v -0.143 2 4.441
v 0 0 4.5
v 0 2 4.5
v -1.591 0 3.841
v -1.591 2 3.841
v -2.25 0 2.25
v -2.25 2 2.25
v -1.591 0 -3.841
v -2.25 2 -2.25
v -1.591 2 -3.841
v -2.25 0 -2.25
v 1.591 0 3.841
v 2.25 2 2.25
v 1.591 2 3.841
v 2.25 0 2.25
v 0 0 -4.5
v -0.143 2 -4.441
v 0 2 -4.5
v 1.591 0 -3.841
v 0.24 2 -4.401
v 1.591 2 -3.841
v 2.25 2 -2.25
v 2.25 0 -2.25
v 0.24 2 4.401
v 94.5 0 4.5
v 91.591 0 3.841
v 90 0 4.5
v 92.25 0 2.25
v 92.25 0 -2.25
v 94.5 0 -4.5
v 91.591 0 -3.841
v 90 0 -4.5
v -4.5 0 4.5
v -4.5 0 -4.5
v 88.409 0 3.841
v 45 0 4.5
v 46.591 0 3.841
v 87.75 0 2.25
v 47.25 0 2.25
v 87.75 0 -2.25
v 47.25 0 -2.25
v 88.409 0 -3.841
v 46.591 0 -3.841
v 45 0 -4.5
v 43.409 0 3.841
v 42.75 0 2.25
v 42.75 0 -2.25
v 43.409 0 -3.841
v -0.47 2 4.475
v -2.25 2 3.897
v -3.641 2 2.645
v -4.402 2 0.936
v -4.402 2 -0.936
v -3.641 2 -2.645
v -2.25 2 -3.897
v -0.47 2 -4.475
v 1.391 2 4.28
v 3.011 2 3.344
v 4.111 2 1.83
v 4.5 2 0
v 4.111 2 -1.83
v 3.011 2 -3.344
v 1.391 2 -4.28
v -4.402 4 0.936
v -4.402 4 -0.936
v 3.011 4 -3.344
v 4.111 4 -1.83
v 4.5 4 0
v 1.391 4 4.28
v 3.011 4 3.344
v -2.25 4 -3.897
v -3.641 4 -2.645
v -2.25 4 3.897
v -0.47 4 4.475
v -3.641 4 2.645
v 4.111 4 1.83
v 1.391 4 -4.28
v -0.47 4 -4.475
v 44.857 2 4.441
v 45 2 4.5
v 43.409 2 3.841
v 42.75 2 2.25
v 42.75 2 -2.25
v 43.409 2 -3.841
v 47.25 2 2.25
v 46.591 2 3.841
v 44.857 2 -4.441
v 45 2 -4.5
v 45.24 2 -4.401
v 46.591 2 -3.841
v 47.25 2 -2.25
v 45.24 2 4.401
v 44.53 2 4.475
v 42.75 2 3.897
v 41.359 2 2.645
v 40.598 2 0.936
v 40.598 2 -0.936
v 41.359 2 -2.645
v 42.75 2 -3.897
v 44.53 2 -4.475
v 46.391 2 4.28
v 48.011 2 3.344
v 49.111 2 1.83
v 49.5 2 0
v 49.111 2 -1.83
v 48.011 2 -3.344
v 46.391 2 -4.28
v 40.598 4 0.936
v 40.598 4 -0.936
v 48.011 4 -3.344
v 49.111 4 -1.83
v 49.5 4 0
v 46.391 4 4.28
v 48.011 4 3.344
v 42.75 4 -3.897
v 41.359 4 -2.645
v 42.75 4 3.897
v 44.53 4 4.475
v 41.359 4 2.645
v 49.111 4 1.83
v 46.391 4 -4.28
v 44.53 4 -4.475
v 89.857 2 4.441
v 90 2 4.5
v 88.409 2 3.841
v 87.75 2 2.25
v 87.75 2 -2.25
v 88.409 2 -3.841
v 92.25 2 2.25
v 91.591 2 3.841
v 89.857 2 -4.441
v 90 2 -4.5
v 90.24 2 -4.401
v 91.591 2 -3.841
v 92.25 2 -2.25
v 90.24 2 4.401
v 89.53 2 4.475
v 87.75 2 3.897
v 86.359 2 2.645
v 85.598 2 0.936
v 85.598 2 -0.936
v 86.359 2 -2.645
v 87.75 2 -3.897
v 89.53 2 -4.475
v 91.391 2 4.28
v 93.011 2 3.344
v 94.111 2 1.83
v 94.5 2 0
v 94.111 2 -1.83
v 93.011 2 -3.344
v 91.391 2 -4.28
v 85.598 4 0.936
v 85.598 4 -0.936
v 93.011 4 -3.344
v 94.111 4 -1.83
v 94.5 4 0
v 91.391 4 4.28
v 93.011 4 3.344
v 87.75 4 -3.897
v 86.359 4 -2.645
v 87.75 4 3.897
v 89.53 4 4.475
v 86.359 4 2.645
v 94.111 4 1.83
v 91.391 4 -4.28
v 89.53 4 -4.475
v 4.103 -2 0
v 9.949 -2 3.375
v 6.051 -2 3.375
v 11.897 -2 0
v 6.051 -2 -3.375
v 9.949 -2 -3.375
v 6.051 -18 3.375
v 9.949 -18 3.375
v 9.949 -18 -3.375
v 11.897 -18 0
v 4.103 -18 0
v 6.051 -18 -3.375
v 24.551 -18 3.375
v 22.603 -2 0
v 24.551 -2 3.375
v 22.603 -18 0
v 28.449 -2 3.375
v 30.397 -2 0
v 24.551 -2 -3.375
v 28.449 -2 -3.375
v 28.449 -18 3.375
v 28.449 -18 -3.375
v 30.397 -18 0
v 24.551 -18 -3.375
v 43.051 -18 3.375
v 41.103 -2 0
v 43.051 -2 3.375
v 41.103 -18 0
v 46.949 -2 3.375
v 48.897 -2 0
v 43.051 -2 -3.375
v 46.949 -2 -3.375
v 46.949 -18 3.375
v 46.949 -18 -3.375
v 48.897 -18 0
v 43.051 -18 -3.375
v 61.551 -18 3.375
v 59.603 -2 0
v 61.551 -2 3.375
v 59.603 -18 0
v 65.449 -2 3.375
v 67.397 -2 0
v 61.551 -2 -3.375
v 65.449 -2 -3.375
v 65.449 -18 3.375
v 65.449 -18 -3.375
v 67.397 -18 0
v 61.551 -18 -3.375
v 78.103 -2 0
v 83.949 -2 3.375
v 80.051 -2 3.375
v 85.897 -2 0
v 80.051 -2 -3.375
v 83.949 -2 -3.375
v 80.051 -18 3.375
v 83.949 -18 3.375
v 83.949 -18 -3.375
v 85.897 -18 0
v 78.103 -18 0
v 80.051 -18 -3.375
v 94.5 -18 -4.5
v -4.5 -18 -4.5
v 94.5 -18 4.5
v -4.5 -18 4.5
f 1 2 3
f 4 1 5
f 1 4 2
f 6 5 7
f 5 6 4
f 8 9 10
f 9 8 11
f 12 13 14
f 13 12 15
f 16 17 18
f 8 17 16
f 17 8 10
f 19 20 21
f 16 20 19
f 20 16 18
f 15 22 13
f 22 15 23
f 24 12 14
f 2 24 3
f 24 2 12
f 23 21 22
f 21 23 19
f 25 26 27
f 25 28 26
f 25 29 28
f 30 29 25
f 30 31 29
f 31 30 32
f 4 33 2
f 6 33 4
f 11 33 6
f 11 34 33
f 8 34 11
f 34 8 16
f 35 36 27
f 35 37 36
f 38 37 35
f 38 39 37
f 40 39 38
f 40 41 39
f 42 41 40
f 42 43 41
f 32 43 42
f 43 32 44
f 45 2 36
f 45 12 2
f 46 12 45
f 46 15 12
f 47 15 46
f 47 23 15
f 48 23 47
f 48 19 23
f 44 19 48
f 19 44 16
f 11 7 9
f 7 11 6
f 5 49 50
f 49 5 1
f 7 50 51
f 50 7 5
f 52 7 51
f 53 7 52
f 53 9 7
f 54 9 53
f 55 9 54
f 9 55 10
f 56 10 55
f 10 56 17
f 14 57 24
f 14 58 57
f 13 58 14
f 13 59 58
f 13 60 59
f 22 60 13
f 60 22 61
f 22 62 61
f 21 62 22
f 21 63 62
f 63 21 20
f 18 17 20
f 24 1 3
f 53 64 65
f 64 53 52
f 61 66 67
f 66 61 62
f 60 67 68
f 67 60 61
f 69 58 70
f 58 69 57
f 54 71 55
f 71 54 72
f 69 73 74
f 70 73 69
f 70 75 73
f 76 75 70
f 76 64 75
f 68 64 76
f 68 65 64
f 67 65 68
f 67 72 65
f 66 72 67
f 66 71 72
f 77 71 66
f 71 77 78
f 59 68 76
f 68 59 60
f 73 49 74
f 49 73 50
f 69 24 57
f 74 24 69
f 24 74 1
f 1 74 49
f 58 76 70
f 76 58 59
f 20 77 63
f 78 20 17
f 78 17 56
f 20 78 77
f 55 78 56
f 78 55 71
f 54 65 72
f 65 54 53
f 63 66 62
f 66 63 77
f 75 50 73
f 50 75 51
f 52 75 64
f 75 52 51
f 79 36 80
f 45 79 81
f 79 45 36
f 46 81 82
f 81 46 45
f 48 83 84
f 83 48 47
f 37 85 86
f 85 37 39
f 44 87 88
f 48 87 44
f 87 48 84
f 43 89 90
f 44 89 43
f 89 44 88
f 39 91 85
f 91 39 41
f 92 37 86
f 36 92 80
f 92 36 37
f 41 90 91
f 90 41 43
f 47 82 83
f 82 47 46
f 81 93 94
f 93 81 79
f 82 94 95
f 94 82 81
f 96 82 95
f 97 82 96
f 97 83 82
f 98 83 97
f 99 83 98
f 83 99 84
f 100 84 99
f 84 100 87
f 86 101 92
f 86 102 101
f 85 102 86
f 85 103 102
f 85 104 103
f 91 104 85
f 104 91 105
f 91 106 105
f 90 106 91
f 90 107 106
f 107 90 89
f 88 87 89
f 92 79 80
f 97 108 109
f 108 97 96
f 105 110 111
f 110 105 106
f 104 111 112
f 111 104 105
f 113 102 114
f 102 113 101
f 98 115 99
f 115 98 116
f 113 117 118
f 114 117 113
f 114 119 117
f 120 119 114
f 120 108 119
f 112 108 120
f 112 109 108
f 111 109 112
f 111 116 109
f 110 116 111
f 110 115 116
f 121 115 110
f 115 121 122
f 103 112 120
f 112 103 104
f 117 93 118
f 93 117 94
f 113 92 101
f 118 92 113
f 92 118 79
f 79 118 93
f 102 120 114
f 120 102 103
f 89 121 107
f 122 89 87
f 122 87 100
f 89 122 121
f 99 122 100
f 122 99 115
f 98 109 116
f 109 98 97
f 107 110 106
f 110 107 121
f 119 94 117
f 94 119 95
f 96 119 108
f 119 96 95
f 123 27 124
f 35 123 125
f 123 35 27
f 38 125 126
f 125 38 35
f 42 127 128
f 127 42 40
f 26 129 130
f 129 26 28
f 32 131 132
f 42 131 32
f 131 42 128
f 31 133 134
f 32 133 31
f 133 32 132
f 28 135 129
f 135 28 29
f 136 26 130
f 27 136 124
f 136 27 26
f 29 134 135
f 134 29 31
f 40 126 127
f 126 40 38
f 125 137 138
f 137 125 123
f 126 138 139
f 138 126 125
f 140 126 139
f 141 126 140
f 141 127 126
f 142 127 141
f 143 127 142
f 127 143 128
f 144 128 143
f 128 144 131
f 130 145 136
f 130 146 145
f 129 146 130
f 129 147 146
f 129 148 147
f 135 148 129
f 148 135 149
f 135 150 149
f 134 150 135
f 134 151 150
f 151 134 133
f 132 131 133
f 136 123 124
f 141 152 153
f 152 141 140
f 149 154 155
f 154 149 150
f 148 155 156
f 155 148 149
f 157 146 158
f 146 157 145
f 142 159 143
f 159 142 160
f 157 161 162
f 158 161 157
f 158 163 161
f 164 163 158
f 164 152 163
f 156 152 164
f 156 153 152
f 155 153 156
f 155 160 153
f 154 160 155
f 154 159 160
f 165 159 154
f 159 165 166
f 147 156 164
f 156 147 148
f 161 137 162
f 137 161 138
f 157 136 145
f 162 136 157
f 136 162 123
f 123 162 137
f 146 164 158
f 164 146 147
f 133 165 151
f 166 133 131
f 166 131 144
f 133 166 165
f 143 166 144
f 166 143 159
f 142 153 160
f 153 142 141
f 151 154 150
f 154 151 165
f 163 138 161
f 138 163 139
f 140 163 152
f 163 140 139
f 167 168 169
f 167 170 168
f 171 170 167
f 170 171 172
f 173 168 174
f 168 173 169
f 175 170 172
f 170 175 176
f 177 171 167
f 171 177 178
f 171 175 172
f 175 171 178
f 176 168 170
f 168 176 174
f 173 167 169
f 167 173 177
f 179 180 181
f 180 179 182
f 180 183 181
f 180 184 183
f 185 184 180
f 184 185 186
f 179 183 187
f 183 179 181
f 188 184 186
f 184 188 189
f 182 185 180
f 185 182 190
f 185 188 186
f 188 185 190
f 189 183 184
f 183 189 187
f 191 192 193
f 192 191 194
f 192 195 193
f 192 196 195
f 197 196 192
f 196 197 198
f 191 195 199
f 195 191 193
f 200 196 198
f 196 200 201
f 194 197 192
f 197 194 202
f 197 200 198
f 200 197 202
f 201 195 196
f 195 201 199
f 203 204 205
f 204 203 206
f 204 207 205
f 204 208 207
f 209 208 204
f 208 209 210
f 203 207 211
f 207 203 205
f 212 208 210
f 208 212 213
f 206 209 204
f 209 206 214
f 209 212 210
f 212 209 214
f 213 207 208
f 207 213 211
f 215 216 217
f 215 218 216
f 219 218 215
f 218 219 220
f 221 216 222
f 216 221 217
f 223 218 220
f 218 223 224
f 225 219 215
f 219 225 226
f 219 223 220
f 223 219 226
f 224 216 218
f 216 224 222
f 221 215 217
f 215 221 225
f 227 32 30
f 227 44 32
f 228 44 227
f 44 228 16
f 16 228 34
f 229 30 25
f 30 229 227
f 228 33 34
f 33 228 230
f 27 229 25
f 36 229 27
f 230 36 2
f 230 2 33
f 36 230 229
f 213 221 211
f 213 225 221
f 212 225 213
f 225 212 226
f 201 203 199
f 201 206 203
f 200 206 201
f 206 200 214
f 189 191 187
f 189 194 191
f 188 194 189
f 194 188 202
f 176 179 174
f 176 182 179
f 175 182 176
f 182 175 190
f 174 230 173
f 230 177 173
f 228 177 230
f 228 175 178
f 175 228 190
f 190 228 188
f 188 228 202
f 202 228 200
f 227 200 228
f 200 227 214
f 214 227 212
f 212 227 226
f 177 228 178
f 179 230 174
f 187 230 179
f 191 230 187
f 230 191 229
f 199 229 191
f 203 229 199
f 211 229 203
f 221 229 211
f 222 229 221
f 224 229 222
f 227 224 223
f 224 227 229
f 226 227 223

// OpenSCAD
// file: peg.scad
pegSlot = 5; // the small opening it slides into
pegD = 9;    // the large opening to put it into
pegH = 22;   // top of large opening to bottom of small opening

holeD = 3.75; // "screw" holes

holeSpacingX = 15;
holeSpacingY = 14.5; // yes, this is actually not a grid. go figure
pegSpacingX = 3 * holeSpacingX;
pegSpacingY = 4 * holeSpacingY;

module peg(t = 2, clearance = 2)
{
    D = pegD;
    d = 4.5;

    rotate([ -90, 0, 0 ])
    {
        hull()
        {
            translate([ 0, (D - d) / 2, 0 ]) cylinder(h = clearance, d = d);
            translate([ 0, -(D - d) / 2, 0 ]) cylinder(h = clearance, d = d);
        }
        translate([ 0, 0, clearance ]) cylinder(h = t, d = D);
    }
}

module pegs(n, t = 2, clearance = 2)
{
    pegSpacingX = 45;
    x0 = ((1 - n) * pegSpacingX) / 2;
    for (i = [0:(n - 1)])
    {
        translate([ x0 + i * pegSpacingX, 0, 0 ]) peg(t, clearance);
    }
}
// file: hexHolder.scad
include <peg.scad>;

function subsum(list, i, n) = i < n ? list[i] + subsum(list, i + 1, n) : 0;

module hexHolder(radiuses, pegs, spacing, depth, margin, t, pegSpacing, width = pegD)
{
    hole = (25.4 / 4 + 2 * margin) * 2 / sqrt(3);
    H = t + depth;

    l = subsum(radiuses, 0, len(radiuses)) + spacing * (len(radiuses) - 1) - radiuses[0] / 2 -
        radiuses[len(radiuses) - 1] / 2;
    L = pegD + (pegs - 1) * pegSpacing;

    difference()
    {
        translate([ -width / 2, -H, -pegD / 2 ]) cube([ width, H, L ]);

        for (i = [0:len(radiuses) - 1])
        {
            z = (L - l) / 2 - pegD / 2 - radiuses[0] / 2 + i * spacing + subsum(radiuses, 0, i + 1) - radiuses[i] / 2;
            translate([ 0, -t, z ]) rotate([ 90, 90, 0 ]) cylinder(h = H, d = hole, $fn = 6);
        }
    }
}

module verticalHexHolder(radiuses, pegs, spacing = 5, depth = 16, margin = 0.2, t = 2, width=pegD)
{
    for (i = [0:pegs - 1])
        translate([ 0, 0, i * pegSpacingY ]) peg(t);
    hexHolder(radiuses, pegs, spacing, depth, margin, t, pegSpacingY, width);
}

module horizontalHexHolder(radiuses, pegs, spacing = 5, depth = 16, margin = 0.2, t = 2, width = pegD)
{
    for (i = [0:pegs - 1])
        translate([ i * pegSpacingX, 0, 0]) peg(t);
    rotate([0,90,0]) hexHolder(radiuses, pegs, spacing, depth, margin, t, pegSpacingX, width);
}
// main file
include<hexHolder.scad>;
horizontalHexHolder([13.5,13.5,13.5,13.5,13.5], 3);
